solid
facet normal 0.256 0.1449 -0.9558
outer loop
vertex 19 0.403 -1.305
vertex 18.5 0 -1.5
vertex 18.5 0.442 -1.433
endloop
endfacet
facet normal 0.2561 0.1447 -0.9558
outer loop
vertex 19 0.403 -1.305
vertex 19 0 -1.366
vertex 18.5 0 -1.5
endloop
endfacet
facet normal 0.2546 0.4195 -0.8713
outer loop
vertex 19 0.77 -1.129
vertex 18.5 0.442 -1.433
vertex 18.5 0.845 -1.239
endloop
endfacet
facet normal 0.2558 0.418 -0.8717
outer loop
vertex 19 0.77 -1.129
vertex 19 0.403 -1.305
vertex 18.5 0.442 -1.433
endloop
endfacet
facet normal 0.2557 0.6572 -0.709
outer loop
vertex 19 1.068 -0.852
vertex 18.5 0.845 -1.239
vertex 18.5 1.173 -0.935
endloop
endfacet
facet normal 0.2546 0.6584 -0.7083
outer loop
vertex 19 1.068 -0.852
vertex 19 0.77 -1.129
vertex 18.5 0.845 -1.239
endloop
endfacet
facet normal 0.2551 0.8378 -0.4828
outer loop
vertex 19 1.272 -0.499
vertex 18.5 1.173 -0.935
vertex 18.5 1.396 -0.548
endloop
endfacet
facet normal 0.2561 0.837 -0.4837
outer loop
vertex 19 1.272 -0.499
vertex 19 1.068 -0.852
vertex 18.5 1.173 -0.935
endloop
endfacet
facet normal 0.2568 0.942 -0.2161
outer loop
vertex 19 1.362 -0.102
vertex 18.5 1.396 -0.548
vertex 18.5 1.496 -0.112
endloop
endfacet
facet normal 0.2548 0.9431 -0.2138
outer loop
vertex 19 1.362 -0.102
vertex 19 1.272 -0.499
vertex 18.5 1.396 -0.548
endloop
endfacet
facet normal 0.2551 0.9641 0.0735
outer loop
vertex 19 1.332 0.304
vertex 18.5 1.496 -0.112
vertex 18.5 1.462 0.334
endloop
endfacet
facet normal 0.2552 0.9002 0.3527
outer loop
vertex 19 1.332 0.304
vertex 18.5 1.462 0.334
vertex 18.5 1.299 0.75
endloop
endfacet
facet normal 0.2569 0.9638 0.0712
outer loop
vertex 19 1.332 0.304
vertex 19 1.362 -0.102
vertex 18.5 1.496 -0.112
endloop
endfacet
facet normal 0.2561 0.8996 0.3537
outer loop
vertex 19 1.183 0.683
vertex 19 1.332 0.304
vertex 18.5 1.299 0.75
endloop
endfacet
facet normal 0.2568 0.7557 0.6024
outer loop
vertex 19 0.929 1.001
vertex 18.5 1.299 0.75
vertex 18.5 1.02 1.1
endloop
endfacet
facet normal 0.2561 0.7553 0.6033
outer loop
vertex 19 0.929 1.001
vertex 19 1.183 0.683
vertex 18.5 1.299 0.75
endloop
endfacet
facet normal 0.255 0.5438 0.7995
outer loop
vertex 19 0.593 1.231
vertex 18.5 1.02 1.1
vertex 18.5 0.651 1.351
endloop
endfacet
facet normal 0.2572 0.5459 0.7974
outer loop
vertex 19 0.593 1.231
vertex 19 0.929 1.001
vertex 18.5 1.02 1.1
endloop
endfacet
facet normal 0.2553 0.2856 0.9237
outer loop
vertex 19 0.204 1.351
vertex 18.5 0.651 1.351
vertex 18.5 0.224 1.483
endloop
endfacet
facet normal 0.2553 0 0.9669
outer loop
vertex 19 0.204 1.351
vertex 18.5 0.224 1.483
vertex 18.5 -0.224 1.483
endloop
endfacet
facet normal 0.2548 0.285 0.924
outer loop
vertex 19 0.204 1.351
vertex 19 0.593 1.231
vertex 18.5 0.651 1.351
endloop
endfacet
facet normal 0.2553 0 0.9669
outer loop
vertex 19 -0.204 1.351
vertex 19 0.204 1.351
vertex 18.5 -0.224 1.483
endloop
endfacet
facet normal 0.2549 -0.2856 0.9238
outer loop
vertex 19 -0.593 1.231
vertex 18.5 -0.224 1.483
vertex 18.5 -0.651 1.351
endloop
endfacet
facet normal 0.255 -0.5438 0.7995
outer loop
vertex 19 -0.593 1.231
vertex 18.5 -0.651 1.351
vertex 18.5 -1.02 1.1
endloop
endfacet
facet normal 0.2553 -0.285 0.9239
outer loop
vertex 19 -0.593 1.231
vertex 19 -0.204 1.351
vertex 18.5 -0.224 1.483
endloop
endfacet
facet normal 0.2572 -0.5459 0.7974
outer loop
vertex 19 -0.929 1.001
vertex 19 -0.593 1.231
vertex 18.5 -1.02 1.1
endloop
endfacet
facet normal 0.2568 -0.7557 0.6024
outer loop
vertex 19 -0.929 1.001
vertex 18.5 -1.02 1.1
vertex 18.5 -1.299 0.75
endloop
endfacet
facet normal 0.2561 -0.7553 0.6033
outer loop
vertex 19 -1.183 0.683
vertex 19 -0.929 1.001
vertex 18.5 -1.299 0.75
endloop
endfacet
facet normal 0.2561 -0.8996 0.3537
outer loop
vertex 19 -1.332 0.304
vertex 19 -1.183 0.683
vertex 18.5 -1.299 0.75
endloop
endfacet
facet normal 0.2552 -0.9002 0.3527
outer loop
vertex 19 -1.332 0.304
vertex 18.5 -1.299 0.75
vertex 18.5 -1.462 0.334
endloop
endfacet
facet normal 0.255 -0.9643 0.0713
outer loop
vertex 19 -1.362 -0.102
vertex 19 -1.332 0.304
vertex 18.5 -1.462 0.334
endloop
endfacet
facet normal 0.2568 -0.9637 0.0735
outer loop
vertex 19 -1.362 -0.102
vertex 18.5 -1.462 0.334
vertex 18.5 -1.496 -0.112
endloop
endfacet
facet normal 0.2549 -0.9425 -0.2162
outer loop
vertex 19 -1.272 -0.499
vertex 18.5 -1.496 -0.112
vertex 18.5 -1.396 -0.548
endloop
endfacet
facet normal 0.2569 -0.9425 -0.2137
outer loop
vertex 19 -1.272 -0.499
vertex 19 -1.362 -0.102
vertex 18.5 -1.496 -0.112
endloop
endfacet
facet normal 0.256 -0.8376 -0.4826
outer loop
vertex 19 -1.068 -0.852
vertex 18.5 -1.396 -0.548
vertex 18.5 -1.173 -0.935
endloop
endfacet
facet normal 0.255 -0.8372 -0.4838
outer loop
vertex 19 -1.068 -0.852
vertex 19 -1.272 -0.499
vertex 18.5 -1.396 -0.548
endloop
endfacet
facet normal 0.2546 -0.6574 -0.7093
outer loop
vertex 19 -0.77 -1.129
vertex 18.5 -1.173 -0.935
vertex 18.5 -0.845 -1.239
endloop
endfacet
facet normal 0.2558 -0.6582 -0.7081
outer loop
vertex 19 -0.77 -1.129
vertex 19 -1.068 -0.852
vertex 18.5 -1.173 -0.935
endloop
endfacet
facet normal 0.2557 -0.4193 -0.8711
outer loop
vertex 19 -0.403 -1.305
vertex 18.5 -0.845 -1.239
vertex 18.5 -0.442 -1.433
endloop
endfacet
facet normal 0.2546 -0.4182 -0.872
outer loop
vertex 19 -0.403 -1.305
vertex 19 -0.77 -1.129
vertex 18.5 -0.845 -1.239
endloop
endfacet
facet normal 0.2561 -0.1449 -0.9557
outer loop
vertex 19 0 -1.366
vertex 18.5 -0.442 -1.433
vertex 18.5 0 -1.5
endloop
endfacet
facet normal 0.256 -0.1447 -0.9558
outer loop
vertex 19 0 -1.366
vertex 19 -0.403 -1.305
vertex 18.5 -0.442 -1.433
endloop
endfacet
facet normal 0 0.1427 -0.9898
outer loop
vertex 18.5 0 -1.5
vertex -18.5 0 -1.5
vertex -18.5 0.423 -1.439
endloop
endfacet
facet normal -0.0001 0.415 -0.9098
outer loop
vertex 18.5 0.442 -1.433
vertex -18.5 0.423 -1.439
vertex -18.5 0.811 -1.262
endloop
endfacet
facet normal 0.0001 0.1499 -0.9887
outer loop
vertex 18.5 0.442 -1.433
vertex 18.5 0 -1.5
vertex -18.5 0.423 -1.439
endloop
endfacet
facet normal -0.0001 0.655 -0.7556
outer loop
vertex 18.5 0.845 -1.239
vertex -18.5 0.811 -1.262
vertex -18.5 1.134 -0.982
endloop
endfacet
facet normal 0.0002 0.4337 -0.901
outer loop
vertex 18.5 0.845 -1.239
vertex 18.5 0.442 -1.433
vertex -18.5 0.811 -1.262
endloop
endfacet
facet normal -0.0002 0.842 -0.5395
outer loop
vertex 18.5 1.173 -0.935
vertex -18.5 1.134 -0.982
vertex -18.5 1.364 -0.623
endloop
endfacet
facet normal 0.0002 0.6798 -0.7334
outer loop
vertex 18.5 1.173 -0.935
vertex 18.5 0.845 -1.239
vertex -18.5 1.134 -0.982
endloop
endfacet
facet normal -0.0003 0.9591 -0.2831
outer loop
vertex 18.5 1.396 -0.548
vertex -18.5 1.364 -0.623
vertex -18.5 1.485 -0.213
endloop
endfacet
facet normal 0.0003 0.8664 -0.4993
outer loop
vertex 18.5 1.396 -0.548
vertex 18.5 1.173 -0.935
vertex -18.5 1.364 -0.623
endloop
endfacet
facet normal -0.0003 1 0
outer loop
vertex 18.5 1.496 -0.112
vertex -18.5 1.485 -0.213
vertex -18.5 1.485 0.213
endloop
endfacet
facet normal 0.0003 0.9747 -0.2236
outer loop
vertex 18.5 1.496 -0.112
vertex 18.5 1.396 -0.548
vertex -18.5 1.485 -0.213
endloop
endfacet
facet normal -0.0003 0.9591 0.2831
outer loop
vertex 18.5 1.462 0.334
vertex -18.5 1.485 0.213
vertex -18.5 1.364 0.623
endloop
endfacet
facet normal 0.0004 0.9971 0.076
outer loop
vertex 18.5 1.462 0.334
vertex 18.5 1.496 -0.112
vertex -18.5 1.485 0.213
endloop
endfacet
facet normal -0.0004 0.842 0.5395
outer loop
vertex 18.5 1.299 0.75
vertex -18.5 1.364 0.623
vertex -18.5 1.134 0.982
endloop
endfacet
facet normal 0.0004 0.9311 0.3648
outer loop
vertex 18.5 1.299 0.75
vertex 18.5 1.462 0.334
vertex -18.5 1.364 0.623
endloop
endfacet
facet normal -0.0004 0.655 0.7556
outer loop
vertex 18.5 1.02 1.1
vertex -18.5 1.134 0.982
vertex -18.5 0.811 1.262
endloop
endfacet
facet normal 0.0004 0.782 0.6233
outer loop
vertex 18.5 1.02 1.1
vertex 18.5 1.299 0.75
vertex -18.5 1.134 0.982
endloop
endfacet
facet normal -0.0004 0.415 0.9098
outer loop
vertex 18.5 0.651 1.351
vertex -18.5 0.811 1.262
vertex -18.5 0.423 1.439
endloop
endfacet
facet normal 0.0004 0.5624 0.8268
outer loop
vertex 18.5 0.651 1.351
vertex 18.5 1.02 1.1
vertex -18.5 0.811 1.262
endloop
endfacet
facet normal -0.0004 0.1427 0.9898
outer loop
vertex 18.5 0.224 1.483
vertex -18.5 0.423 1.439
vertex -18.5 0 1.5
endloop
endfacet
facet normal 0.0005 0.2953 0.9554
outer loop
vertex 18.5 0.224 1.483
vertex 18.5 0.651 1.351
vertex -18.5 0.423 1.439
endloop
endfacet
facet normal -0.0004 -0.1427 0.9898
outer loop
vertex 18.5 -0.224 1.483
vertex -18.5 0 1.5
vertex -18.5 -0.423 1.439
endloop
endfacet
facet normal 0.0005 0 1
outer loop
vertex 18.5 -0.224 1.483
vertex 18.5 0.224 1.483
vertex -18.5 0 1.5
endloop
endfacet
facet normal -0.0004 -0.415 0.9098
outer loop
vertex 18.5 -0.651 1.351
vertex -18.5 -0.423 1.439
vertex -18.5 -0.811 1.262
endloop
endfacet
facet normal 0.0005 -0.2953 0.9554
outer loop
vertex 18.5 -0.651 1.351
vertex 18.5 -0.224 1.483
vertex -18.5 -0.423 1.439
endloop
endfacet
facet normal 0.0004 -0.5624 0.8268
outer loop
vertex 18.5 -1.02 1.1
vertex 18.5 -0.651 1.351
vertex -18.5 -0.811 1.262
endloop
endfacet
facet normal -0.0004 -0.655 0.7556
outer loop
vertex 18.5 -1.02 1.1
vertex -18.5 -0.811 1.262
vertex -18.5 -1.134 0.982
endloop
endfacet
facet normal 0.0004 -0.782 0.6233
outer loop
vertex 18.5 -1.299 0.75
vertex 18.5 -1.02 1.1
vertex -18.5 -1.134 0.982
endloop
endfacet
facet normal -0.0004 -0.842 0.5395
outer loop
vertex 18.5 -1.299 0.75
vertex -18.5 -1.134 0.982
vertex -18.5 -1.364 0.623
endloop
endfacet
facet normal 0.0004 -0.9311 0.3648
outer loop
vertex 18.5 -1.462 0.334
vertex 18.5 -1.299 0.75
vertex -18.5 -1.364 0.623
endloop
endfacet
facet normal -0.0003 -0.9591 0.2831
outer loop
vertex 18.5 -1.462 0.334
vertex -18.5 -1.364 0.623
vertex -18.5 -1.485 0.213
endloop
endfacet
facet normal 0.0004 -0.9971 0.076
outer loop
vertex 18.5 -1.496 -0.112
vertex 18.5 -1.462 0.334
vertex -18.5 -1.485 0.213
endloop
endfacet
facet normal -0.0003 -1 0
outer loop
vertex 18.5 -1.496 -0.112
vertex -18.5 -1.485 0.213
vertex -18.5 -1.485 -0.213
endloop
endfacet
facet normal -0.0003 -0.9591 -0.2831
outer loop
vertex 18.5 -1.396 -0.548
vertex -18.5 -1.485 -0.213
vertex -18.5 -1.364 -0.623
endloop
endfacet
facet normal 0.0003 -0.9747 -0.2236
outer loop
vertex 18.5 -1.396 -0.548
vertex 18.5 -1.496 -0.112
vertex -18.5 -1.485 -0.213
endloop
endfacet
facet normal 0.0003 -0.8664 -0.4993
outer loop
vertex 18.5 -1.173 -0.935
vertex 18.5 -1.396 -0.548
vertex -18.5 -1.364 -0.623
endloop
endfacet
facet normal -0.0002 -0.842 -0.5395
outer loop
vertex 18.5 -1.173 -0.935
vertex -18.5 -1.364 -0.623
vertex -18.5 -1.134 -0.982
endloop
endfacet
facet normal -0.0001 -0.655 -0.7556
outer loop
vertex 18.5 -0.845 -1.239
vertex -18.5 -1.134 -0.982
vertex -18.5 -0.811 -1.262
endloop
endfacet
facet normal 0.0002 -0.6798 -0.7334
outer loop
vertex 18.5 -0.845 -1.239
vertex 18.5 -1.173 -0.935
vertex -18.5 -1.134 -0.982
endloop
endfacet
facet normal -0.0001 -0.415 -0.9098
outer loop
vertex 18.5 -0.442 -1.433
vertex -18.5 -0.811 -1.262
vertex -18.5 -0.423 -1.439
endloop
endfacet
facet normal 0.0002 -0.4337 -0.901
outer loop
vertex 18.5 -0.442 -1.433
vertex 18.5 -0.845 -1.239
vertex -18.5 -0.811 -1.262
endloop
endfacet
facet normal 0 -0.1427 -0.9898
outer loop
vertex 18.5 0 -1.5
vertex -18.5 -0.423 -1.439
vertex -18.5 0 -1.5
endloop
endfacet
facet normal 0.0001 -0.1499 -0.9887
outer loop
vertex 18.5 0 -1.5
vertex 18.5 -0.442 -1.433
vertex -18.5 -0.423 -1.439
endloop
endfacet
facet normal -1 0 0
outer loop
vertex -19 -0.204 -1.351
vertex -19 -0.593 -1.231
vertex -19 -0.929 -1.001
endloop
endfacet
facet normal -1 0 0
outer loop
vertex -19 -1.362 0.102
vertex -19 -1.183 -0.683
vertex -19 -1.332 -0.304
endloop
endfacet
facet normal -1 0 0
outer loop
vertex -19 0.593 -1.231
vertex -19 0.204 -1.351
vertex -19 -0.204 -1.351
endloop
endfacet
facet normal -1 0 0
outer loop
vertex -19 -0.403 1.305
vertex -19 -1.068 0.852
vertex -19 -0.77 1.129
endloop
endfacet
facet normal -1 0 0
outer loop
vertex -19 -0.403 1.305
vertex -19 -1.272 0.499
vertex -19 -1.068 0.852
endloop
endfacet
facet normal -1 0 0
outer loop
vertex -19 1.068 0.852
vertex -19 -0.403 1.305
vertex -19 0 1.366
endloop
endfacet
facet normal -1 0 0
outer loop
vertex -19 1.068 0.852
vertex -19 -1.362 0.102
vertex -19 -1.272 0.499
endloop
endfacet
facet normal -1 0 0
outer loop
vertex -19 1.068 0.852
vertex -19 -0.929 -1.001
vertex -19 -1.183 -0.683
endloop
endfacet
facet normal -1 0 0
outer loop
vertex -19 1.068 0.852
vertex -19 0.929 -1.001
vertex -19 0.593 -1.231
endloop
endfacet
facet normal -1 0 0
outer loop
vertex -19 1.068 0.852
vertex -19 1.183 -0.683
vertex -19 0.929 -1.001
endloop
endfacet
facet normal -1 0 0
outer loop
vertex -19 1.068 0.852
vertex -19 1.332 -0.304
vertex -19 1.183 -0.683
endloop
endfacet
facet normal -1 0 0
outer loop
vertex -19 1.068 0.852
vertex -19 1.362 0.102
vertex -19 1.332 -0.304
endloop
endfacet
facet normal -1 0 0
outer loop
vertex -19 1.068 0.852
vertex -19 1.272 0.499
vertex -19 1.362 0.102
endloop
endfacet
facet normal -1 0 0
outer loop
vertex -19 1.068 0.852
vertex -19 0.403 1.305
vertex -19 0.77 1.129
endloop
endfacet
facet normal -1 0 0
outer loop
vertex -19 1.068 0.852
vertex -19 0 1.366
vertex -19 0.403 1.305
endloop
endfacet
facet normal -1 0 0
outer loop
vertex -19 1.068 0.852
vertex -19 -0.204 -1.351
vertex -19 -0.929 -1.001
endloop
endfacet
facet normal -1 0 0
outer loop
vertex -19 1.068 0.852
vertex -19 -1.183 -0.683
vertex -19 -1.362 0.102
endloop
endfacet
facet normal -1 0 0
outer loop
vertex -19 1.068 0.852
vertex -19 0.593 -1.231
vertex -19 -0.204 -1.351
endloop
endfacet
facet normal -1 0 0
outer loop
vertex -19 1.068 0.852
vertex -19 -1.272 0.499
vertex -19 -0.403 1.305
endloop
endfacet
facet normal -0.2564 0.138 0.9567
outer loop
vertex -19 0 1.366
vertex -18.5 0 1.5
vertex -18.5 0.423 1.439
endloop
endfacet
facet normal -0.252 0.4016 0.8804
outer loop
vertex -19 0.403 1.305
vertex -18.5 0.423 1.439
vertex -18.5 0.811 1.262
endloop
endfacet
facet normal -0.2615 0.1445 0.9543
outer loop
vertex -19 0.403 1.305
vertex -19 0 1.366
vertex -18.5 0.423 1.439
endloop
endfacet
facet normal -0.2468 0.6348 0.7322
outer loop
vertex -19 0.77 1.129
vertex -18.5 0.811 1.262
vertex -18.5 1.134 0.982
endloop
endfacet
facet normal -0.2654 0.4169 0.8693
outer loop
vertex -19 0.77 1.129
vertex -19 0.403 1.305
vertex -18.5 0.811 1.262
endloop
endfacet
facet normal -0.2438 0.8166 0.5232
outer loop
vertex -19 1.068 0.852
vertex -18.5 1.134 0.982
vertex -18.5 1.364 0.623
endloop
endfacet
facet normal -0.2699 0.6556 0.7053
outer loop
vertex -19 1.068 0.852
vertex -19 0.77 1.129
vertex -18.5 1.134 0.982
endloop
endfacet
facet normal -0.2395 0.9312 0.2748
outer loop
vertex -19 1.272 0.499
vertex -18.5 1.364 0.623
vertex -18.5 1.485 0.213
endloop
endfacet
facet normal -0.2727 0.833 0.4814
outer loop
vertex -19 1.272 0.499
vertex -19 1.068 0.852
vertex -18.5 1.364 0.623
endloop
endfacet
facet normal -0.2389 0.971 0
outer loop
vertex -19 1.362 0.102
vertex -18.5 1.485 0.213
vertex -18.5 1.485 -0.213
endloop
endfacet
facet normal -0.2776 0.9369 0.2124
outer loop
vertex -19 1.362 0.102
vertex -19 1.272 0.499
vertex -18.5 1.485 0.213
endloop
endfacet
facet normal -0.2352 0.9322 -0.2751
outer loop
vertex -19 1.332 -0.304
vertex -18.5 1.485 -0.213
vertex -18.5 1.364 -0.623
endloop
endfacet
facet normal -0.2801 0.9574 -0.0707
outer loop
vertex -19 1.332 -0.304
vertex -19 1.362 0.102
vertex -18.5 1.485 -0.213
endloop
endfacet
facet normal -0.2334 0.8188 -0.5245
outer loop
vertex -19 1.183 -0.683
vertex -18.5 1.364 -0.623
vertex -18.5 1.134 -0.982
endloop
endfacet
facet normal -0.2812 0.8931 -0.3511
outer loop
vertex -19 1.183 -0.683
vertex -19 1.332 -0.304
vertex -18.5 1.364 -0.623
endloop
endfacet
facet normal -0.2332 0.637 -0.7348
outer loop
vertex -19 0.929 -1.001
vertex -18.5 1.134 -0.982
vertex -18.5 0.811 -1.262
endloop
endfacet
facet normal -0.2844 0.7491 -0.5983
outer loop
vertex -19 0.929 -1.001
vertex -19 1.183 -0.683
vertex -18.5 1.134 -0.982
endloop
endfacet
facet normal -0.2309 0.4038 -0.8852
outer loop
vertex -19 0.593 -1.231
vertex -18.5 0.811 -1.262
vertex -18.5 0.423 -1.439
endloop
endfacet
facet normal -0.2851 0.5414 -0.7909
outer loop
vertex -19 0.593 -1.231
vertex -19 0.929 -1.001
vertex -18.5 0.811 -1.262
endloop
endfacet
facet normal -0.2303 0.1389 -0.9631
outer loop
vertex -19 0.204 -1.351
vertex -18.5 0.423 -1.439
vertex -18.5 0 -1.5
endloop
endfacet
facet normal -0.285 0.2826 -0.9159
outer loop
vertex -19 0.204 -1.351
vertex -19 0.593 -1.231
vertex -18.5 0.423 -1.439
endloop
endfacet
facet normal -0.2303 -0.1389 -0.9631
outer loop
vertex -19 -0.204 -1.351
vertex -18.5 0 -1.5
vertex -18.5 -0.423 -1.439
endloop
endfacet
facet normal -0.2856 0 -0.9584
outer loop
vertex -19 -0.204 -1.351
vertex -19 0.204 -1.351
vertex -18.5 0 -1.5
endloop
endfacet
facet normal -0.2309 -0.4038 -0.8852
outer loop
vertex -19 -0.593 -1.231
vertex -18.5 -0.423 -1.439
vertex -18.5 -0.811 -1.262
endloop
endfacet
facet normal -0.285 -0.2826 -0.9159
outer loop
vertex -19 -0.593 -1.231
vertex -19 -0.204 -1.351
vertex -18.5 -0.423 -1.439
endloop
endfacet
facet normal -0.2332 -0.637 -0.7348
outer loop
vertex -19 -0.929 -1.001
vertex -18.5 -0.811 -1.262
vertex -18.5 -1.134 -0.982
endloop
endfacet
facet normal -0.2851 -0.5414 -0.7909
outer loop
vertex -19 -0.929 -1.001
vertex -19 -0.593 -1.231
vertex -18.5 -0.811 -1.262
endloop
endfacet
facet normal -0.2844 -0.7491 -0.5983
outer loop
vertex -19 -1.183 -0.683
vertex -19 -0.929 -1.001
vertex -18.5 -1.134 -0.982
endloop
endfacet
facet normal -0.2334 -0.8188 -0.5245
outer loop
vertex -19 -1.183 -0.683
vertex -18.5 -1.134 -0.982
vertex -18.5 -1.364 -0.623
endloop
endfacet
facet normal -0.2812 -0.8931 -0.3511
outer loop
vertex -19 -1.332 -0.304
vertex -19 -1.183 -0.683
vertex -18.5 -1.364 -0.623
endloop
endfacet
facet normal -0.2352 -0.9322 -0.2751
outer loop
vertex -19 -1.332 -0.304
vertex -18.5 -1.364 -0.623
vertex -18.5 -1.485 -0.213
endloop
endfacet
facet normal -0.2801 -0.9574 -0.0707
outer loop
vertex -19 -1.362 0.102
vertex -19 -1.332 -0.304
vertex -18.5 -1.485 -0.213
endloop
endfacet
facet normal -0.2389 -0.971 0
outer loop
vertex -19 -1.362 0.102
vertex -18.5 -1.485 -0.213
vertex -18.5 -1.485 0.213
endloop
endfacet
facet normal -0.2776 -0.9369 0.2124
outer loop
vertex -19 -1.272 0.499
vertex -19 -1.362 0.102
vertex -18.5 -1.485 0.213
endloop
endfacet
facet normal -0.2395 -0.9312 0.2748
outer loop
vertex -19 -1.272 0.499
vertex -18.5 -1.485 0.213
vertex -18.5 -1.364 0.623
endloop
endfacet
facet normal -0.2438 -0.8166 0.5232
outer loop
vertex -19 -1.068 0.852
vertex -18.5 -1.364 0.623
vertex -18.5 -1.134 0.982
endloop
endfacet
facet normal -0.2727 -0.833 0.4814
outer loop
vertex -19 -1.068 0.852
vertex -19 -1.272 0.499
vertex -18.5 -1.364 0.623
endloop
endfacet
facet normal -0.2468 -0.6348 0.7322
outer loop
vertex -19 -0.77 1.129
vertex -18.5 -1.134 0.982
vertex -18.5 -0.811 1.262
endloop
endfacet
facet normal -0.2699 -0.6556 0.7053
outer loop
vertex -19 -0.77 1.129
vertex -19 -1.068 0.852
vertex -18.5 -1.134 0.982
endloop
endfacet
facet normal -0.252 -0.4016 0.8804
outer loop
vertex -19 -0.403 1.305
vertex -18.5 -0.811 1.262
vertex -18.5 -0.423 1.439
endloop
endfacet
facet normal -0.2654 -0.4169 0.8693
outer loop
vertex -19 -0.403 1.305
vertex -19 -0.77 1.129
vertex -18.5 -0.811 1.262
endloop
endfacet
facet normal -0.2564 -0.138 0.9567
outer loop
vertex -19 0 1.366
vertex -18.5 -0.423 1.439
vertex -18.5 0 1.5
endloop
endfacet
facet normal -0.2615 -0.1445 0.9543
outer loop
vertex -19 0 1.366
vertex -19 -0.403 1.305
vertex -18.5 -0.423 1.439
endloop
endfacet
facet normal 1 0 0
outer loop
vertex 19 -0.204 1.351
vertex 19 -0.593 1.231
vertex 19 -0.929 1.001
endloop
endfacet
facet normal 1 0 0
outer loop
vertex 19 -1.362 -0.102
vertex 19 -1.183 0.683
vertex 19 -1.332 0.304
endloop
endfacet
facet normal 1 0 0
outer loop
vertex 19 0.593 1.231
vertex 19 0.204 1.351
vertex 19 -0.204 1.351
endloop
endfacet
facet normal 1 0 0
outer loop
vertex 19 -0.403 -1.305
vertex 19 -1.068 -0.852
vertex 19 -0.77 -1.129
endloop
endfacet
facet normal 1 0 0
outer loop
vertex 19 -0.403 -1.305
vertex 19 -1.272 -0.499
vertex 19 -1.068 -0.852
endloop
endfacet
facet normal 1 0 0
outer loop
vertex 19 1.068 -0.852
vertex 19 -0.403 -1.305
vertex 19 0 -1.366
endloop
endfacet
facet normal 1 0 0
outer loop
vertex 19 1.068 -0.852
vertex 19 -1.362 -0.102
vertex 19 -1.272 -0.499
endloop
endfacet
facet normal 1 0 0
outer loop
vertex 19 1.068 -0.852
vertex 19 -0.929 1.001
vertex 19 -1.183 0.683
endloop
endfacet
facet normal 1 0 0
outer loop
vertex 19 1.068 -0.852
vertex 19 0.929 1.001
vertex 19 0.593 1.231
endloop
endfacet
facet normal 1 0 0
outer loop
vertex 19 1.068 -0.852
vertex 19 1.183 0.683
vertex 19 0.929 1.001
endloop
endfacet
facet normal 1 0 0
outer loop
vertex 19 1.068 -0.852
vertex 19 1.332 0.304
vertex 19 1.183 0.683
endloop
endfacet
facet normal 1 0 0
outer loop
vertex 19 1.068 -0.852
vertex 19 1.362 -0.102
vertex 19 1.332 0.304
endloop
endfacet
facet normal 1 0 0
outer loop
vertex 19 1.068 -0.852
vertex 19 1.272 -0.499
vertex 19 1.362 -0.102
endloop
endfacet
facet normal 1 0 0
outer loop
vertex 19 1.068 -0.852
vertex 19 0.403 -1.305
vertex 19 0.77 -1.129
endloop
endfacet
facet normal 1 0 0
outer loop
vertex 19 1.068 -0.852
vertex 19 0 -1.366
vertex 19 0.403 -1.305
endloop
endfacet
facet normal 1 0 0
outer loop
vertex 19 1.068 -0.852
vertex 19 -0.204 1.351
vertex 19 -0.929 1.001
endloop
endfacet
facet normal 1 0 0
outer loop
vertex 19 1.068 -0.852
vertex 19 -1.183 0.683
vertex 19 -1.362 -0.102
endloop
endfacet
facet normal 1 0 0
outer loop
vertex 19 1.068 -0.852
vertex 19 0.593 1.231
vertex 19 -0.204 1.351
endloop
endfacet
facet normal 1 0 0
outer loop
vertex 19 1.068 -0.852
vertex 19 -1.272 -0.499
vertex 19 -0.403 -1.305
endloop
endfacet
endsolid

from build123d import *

# Parameters (mm, degrees)
SKETCH2_R           = 1.5
EXTRUDE1_DEPTH      = 18.5
EXTRUDE1_DEPTH_BACK = 18.5
SKETCH3_R           = 1.5
EXTRUDE2_DEPTH      = 0.5
EXTRUDE2_TAPER      = 15
SKETCH4_R           = 1.5
EXTRUDE3_DEPTH      = 0.5
EXTRUDE3_TAPER      = 15


with BuildPart() as part:
    # Sketch2 → Extrude1 (new body, two sides)
    with BuildSketch(Plane(origin=(0, 0, 0), x_dir=(0, 0, -1), z_dir=(1, 0, 0))) as extrude1_sk:
        Circle(SKETCH2_R)
    extrude(amount=EXTRUDE1_DEPTH)
    extrude(extrude1_sk.sketch, amount=-EXTRUDE1_DEPTH_BACK)

    # Sketch3 → Extrude2 (add)
    with BuildSketch(Plane(origin=(18.5, 0, 0), x_dir=(0, 0, -1), z_dir=(1, 0, 0))):
        Circle(SKETCH3_R)
    extrude(amount=EXTRUDE2_DEPTH, taper=EXTRUDE2_TAPER)

    # Sketch4 → Extrude3 (add)
    with BuildSketch(Plane.ZY.offset(18.5)):
        Circle(SKETCH4_R)
    extrude(amount=EXTRUDE3_DEPTH, taper=EXTRUDE3_TAPER)


solid = part.part
